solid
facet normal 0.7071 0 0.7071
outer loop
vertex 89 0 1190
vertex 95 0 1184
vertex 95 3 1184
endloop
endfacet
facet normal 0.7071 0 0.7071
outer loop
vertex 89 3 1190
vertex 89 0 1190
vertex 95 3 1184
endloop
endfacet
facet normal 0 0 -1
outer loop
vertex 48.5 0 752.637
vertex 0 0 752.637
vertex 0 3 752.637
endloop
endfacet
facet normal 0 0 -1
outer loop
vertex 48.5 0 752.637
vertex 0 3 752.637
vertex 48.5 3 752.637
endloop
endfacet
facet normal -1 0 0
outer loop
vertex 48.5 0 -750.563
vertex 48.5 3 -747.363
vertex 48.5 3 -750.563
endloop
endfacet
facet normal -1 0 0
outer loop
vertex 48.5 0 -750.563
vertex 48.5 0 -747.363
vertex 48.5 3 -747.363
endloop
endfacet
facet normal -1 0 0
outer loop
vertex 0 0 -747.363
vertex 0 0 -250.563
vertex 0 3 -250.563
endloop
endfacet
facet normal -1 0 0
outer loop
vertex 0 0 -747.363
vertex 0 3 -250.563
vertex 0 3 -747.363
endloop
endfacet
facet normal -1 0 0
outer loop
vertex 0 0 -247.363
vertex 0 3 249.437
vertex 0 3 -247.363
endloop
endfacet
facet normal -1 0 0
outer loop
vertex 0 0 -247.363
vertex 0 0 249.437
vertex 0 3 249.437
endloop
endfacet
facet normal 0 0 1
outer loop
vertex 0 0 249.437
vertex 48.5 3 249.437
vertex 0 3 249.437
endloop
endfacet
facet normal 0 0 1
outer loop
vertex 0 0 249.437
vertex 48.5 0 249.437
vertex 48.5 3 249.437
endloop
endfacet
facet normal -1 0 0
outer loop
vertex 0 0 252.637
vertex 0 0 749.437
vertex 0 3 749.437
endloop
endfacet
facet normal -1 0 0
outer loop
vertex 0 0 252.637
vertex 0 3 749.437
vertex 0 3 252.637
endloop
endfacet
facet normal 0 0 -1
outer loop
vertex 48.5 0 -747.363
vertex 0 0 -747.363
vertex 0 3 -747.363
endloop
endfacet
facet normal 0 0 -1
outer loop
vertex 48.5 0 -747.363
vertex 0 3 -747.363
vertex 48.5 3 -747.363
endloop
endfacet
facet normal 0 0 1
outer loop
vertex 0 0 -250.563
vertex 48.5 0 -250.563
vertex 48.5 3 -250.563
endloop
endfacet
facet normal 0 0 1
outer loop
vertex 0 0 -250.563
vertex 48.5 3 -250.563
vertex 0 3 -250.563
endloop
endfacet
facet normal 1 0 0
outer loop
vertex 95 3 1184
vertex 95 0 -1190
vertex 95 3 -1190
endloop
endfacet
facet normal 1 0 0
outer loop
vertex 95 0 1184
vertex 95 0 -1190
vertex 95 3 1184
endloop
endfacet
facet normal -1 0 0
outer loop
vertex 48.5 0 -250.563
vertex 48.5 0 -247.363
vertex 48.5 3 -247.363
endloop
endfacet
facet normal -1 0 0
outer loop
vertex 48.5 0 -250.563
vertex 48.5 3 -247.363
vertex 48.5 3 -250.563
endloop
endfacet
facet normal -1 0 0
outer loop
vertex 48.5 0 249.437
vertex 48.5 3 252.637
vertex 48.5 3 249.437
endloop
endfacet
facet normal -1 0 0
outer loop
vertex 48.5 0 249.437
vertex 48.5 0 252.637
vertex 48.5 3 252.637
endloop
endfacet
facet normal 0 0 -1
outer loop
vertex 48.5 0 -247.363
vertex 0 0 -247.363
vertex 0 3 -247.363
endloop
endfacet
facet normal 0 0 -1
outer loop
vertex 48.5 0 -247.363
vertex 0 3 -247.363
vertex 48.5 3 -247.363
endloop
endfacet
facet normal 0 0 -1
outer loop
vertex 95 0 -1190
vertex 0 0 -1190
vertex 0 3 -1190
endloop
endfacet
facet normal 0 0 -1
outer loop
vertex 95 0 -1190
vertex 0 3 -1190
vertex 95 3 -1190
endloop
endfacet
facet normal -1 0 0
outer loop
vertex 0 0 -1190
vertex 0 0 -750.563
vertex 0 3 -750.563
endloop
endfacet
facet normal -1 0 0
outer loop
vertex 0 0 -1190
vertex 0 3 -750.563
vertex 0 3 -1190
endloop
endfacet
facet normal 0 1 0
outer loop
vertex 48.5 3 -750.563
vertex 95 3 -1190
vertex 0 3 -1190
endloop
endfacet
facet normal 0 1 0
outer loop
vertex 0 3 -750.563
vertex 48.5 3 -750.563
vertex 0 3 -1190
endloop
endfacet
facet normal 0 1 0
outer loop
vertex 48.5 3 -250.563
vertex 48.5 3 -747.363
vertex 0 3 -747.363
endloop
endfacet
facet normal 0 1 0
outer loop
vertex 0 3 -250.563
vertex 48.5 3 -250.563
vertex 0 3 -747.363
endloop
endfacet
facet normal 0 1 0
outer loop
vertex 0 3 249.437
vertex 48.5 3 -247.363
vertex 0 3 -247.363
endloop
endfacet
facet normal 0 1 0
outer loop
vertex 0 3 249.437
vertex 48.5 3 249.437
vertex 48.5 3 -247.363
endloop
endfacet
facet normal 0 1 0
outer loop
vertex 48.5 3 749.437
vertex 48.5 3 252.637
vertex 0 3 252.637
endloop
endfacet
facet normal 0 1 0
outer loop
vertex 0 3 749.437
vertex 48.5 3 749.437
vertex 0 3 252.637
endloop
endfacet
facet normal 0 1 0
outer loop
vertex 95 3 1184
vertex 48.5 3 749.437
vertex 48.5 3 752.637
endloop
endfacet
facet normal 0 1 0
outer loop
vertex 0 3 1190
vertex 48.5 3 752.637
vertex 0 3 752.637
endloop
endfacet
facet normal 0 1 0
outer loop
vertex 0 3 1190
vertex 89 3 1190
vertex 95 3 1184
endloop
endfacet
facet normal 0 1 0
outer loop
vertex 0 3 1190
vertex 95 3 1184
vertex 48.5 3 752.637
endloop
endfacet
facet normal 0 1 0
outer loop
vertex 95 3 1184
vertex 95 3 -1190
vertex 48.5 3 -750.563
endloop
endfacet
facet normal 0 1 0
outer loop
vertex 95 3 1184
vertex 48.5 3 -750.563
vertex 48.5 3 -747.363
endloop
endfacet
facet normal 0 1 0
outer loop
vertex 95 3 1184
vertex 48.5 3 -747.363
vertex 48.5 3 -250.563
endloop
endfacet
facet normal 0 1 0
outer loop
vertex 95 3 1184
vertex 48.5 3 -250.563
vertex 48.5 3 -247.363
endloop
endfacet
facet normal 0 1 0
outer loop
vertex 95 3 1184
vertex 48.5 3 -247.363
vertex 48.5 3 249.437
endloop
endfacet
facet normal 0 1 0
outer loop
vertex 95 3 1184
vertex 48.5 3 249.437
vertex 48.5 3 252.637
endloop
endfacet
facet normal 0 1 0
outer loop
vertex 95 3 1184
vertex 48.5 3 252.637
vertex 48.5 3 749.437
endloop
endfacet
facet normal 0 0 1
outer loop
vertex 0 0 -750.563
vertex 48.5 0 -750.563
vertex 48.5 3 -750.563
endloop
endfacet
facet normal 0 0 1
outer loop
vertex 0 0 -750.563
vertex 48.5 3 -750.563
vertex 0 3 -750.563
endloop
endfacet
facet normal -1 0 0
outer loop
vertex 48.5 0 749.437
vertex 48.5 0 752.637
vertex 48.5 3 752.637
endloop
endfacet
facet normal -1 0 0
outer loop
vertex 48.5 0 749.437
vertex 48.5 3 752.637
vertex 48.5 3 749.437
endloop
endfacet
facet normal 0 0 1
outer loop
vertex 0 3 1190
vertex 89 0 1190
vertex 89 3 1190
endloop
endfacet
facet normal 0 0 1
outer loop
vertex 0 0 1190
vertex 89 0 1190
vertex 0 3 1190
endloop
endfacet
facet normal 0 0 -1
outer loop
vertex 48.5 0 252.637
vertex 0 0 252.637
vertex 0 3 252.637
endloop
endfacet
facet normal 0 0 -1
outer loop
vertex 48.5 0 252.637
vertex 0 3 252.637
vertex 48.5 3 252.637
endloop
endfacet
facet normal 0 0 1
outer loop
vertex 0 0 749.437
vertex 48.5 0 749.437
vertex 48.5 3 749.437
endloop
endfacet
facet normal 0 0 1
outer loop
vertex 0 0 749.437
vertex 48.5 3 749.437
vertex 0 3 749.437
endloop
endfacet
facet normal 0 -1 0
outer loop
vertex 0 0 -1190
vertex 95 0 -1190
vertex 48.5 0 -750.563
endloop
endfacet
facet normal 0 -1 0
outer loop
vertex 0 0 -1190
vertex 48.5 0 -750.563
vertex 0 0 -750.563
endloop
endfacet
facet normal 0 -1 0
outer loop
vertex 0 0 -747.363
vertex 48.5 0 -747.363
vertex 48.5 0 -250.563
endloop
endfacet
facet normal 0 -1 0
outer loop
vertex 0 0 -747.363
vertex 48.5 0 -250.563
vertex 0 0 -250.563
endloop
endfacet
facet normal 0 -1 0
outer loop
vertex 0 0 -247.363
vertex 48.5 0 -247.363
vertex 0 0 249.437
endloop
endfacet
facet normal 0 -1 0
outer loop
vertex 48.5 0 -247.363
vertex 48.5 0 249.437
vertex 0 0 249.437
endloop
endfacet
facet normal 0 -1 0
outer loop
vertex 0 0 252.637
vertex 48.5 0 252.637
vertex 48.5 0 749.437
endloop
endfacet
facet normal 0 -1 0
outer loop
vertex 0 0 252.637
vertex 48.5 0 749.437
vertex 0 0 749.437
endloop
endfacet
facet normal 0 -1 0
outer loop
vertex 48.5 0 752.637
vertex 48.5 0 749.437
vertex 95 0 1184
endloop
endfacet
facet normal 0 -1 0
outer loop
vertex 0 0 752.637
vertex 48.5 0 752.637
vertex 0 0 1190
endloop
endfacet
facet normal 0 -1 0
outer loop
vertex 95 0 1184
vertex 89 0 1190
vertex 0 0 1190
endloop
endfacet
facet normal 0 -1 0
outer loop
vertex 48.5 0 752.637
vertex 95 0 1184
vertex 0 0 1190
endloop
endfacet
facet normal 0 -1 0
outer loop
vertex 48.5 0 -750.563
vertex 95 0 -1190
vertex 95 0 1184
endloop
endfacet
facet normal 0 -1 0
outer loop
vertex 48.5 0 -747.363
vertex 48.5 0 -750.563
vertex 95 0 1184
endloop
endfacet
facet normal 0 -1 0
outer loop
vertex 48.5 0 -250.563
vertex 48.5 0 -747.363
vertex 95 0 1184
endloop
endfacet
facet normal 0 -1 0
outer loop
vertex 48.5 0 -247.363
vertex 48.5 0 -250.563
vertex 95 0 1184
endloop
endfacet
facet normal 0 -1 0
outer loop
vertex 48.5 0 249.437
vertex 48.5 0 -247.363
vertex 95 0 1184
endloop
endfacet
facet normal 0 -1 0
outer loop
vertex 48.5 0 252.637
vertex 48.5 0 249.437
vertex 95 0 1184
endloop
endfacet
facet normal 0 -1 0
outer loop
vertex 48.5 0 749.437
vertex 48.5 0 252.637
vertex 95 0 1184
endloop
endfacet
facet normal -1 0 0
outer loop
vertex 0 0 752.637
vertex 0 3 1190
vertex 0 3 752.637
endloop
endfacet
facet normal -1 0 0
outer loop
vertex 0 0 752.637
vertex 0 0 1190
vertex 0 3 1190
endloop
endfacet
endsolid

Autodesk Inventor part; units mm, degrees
ref_plane "YZ Plane" through (0, 0, 0) normal (1, 0, 0) x (0, 1, 0)
ref_plane "XZ Plane" through (0, 0, 0) normal (0, 1, 0) x (-1, 0, 0)
ref_plane "XY Plane" through (0, 0, 0) normal (0, 0, 1) x (1, 0, 0)
sketch "Sketch6" plane through (0, 0, 0) normal (0, 1, 0) x (-1, 0, 0)
  line L0 (0, -1190) -> (-95, -1190)
  line L1 (-95, -1190) -> (-95, 1190)
  line L2 (-95, 1190) -> (0, 1190)
  line L3 (0, 1190) -> (0, -1190)
  point P0 (-4059.1747, 1994.2978)
  point P1 (0, 0)
  point P2 (0, 0)
  dimension "d26" = 95
  dimension "d27" = 2380
extrude "Plate4" add sketch "Sketch6" along normal blind 3
sketch "Sketch7" plane through (0, 0, 0) normal (0, -1, 0) x (1, 0, 0)
  line L0 (0, 1190) -> (95, 1190) projected
  line L1 (0, -1190) -> (0, 1190) projected
  line L2 (95, -1190) -> (0, -1190) projected
  line L3 (95, 1190) -> (95, -1190) projected
  line L4 (0, -747.363) -> (48.5, -747.363)
  line L5 (48.5, -747.363) -> (48.5, -750.563)
  line L6 (48.5, -750.563) -> (0, -750.563)
  line L7 (0, -750.563) -> (0, -747.363)
  point P0 (0, 0)
  point P1 (0, -750.563)
  point P2 (0, 200)
  point P3 (46.4173, 200)
  point P4 (0, -750.563)
  dimension "d29" = 48.5
  dimension "d30" = 3.2
  dimension "d31" = 439.437
extrude "Extrusion2" cut sketch "Sketch7" against normal through all contours L4 L5 L6 L1
pattern_linear "Rectangular Pattern1" count 5 spacing 500 along (0, 0, 1) of "Extrusion2"
chamfer "Corner Chamfer1" distance 6 angle 45 1 edges at (95, 1.5, 1190)
sketch "Sketch8" plane through (0, 0, 0) normal (0, -1, 0) x (1, 0, 0)
  line L0 (29.9047, -1161.7913) -> (29.9047, -981.1247) construction
  line L1 (29.9047, -981.1247) -> (52.3735, -981.1247) construction
  line L2 (52.3735, -981.1247) -> (52.3735, -1161.7913) construction
  line L3 (52.3735, -1161.7913) -> (29.9047, -1161.7913) construction
  point P0 (0, 0)
mark "Mark1"
equation "\"d28\" = Thickness"
equation "\"BendReliefWidth\" = Thickness"
equation "\"BendReliefDepth\" = 0.5 * Thickness"
equation "\"CornerReliefSize\" = 4 * Thickness"
equation "\"MinimumRemnant\" = 2 * Thickness"
equation "\"TransitionRadius\" = BendRadius"
equation "\"JacobiRadiusSize\" = BendRadius"
equation "\"GapSize\" = Thickness"
equation "\"Thickness\" = 3"
equation "\"BendRadius\" = 5"
properties part number "BSH 038 stringer butt end" material "09g2s"
